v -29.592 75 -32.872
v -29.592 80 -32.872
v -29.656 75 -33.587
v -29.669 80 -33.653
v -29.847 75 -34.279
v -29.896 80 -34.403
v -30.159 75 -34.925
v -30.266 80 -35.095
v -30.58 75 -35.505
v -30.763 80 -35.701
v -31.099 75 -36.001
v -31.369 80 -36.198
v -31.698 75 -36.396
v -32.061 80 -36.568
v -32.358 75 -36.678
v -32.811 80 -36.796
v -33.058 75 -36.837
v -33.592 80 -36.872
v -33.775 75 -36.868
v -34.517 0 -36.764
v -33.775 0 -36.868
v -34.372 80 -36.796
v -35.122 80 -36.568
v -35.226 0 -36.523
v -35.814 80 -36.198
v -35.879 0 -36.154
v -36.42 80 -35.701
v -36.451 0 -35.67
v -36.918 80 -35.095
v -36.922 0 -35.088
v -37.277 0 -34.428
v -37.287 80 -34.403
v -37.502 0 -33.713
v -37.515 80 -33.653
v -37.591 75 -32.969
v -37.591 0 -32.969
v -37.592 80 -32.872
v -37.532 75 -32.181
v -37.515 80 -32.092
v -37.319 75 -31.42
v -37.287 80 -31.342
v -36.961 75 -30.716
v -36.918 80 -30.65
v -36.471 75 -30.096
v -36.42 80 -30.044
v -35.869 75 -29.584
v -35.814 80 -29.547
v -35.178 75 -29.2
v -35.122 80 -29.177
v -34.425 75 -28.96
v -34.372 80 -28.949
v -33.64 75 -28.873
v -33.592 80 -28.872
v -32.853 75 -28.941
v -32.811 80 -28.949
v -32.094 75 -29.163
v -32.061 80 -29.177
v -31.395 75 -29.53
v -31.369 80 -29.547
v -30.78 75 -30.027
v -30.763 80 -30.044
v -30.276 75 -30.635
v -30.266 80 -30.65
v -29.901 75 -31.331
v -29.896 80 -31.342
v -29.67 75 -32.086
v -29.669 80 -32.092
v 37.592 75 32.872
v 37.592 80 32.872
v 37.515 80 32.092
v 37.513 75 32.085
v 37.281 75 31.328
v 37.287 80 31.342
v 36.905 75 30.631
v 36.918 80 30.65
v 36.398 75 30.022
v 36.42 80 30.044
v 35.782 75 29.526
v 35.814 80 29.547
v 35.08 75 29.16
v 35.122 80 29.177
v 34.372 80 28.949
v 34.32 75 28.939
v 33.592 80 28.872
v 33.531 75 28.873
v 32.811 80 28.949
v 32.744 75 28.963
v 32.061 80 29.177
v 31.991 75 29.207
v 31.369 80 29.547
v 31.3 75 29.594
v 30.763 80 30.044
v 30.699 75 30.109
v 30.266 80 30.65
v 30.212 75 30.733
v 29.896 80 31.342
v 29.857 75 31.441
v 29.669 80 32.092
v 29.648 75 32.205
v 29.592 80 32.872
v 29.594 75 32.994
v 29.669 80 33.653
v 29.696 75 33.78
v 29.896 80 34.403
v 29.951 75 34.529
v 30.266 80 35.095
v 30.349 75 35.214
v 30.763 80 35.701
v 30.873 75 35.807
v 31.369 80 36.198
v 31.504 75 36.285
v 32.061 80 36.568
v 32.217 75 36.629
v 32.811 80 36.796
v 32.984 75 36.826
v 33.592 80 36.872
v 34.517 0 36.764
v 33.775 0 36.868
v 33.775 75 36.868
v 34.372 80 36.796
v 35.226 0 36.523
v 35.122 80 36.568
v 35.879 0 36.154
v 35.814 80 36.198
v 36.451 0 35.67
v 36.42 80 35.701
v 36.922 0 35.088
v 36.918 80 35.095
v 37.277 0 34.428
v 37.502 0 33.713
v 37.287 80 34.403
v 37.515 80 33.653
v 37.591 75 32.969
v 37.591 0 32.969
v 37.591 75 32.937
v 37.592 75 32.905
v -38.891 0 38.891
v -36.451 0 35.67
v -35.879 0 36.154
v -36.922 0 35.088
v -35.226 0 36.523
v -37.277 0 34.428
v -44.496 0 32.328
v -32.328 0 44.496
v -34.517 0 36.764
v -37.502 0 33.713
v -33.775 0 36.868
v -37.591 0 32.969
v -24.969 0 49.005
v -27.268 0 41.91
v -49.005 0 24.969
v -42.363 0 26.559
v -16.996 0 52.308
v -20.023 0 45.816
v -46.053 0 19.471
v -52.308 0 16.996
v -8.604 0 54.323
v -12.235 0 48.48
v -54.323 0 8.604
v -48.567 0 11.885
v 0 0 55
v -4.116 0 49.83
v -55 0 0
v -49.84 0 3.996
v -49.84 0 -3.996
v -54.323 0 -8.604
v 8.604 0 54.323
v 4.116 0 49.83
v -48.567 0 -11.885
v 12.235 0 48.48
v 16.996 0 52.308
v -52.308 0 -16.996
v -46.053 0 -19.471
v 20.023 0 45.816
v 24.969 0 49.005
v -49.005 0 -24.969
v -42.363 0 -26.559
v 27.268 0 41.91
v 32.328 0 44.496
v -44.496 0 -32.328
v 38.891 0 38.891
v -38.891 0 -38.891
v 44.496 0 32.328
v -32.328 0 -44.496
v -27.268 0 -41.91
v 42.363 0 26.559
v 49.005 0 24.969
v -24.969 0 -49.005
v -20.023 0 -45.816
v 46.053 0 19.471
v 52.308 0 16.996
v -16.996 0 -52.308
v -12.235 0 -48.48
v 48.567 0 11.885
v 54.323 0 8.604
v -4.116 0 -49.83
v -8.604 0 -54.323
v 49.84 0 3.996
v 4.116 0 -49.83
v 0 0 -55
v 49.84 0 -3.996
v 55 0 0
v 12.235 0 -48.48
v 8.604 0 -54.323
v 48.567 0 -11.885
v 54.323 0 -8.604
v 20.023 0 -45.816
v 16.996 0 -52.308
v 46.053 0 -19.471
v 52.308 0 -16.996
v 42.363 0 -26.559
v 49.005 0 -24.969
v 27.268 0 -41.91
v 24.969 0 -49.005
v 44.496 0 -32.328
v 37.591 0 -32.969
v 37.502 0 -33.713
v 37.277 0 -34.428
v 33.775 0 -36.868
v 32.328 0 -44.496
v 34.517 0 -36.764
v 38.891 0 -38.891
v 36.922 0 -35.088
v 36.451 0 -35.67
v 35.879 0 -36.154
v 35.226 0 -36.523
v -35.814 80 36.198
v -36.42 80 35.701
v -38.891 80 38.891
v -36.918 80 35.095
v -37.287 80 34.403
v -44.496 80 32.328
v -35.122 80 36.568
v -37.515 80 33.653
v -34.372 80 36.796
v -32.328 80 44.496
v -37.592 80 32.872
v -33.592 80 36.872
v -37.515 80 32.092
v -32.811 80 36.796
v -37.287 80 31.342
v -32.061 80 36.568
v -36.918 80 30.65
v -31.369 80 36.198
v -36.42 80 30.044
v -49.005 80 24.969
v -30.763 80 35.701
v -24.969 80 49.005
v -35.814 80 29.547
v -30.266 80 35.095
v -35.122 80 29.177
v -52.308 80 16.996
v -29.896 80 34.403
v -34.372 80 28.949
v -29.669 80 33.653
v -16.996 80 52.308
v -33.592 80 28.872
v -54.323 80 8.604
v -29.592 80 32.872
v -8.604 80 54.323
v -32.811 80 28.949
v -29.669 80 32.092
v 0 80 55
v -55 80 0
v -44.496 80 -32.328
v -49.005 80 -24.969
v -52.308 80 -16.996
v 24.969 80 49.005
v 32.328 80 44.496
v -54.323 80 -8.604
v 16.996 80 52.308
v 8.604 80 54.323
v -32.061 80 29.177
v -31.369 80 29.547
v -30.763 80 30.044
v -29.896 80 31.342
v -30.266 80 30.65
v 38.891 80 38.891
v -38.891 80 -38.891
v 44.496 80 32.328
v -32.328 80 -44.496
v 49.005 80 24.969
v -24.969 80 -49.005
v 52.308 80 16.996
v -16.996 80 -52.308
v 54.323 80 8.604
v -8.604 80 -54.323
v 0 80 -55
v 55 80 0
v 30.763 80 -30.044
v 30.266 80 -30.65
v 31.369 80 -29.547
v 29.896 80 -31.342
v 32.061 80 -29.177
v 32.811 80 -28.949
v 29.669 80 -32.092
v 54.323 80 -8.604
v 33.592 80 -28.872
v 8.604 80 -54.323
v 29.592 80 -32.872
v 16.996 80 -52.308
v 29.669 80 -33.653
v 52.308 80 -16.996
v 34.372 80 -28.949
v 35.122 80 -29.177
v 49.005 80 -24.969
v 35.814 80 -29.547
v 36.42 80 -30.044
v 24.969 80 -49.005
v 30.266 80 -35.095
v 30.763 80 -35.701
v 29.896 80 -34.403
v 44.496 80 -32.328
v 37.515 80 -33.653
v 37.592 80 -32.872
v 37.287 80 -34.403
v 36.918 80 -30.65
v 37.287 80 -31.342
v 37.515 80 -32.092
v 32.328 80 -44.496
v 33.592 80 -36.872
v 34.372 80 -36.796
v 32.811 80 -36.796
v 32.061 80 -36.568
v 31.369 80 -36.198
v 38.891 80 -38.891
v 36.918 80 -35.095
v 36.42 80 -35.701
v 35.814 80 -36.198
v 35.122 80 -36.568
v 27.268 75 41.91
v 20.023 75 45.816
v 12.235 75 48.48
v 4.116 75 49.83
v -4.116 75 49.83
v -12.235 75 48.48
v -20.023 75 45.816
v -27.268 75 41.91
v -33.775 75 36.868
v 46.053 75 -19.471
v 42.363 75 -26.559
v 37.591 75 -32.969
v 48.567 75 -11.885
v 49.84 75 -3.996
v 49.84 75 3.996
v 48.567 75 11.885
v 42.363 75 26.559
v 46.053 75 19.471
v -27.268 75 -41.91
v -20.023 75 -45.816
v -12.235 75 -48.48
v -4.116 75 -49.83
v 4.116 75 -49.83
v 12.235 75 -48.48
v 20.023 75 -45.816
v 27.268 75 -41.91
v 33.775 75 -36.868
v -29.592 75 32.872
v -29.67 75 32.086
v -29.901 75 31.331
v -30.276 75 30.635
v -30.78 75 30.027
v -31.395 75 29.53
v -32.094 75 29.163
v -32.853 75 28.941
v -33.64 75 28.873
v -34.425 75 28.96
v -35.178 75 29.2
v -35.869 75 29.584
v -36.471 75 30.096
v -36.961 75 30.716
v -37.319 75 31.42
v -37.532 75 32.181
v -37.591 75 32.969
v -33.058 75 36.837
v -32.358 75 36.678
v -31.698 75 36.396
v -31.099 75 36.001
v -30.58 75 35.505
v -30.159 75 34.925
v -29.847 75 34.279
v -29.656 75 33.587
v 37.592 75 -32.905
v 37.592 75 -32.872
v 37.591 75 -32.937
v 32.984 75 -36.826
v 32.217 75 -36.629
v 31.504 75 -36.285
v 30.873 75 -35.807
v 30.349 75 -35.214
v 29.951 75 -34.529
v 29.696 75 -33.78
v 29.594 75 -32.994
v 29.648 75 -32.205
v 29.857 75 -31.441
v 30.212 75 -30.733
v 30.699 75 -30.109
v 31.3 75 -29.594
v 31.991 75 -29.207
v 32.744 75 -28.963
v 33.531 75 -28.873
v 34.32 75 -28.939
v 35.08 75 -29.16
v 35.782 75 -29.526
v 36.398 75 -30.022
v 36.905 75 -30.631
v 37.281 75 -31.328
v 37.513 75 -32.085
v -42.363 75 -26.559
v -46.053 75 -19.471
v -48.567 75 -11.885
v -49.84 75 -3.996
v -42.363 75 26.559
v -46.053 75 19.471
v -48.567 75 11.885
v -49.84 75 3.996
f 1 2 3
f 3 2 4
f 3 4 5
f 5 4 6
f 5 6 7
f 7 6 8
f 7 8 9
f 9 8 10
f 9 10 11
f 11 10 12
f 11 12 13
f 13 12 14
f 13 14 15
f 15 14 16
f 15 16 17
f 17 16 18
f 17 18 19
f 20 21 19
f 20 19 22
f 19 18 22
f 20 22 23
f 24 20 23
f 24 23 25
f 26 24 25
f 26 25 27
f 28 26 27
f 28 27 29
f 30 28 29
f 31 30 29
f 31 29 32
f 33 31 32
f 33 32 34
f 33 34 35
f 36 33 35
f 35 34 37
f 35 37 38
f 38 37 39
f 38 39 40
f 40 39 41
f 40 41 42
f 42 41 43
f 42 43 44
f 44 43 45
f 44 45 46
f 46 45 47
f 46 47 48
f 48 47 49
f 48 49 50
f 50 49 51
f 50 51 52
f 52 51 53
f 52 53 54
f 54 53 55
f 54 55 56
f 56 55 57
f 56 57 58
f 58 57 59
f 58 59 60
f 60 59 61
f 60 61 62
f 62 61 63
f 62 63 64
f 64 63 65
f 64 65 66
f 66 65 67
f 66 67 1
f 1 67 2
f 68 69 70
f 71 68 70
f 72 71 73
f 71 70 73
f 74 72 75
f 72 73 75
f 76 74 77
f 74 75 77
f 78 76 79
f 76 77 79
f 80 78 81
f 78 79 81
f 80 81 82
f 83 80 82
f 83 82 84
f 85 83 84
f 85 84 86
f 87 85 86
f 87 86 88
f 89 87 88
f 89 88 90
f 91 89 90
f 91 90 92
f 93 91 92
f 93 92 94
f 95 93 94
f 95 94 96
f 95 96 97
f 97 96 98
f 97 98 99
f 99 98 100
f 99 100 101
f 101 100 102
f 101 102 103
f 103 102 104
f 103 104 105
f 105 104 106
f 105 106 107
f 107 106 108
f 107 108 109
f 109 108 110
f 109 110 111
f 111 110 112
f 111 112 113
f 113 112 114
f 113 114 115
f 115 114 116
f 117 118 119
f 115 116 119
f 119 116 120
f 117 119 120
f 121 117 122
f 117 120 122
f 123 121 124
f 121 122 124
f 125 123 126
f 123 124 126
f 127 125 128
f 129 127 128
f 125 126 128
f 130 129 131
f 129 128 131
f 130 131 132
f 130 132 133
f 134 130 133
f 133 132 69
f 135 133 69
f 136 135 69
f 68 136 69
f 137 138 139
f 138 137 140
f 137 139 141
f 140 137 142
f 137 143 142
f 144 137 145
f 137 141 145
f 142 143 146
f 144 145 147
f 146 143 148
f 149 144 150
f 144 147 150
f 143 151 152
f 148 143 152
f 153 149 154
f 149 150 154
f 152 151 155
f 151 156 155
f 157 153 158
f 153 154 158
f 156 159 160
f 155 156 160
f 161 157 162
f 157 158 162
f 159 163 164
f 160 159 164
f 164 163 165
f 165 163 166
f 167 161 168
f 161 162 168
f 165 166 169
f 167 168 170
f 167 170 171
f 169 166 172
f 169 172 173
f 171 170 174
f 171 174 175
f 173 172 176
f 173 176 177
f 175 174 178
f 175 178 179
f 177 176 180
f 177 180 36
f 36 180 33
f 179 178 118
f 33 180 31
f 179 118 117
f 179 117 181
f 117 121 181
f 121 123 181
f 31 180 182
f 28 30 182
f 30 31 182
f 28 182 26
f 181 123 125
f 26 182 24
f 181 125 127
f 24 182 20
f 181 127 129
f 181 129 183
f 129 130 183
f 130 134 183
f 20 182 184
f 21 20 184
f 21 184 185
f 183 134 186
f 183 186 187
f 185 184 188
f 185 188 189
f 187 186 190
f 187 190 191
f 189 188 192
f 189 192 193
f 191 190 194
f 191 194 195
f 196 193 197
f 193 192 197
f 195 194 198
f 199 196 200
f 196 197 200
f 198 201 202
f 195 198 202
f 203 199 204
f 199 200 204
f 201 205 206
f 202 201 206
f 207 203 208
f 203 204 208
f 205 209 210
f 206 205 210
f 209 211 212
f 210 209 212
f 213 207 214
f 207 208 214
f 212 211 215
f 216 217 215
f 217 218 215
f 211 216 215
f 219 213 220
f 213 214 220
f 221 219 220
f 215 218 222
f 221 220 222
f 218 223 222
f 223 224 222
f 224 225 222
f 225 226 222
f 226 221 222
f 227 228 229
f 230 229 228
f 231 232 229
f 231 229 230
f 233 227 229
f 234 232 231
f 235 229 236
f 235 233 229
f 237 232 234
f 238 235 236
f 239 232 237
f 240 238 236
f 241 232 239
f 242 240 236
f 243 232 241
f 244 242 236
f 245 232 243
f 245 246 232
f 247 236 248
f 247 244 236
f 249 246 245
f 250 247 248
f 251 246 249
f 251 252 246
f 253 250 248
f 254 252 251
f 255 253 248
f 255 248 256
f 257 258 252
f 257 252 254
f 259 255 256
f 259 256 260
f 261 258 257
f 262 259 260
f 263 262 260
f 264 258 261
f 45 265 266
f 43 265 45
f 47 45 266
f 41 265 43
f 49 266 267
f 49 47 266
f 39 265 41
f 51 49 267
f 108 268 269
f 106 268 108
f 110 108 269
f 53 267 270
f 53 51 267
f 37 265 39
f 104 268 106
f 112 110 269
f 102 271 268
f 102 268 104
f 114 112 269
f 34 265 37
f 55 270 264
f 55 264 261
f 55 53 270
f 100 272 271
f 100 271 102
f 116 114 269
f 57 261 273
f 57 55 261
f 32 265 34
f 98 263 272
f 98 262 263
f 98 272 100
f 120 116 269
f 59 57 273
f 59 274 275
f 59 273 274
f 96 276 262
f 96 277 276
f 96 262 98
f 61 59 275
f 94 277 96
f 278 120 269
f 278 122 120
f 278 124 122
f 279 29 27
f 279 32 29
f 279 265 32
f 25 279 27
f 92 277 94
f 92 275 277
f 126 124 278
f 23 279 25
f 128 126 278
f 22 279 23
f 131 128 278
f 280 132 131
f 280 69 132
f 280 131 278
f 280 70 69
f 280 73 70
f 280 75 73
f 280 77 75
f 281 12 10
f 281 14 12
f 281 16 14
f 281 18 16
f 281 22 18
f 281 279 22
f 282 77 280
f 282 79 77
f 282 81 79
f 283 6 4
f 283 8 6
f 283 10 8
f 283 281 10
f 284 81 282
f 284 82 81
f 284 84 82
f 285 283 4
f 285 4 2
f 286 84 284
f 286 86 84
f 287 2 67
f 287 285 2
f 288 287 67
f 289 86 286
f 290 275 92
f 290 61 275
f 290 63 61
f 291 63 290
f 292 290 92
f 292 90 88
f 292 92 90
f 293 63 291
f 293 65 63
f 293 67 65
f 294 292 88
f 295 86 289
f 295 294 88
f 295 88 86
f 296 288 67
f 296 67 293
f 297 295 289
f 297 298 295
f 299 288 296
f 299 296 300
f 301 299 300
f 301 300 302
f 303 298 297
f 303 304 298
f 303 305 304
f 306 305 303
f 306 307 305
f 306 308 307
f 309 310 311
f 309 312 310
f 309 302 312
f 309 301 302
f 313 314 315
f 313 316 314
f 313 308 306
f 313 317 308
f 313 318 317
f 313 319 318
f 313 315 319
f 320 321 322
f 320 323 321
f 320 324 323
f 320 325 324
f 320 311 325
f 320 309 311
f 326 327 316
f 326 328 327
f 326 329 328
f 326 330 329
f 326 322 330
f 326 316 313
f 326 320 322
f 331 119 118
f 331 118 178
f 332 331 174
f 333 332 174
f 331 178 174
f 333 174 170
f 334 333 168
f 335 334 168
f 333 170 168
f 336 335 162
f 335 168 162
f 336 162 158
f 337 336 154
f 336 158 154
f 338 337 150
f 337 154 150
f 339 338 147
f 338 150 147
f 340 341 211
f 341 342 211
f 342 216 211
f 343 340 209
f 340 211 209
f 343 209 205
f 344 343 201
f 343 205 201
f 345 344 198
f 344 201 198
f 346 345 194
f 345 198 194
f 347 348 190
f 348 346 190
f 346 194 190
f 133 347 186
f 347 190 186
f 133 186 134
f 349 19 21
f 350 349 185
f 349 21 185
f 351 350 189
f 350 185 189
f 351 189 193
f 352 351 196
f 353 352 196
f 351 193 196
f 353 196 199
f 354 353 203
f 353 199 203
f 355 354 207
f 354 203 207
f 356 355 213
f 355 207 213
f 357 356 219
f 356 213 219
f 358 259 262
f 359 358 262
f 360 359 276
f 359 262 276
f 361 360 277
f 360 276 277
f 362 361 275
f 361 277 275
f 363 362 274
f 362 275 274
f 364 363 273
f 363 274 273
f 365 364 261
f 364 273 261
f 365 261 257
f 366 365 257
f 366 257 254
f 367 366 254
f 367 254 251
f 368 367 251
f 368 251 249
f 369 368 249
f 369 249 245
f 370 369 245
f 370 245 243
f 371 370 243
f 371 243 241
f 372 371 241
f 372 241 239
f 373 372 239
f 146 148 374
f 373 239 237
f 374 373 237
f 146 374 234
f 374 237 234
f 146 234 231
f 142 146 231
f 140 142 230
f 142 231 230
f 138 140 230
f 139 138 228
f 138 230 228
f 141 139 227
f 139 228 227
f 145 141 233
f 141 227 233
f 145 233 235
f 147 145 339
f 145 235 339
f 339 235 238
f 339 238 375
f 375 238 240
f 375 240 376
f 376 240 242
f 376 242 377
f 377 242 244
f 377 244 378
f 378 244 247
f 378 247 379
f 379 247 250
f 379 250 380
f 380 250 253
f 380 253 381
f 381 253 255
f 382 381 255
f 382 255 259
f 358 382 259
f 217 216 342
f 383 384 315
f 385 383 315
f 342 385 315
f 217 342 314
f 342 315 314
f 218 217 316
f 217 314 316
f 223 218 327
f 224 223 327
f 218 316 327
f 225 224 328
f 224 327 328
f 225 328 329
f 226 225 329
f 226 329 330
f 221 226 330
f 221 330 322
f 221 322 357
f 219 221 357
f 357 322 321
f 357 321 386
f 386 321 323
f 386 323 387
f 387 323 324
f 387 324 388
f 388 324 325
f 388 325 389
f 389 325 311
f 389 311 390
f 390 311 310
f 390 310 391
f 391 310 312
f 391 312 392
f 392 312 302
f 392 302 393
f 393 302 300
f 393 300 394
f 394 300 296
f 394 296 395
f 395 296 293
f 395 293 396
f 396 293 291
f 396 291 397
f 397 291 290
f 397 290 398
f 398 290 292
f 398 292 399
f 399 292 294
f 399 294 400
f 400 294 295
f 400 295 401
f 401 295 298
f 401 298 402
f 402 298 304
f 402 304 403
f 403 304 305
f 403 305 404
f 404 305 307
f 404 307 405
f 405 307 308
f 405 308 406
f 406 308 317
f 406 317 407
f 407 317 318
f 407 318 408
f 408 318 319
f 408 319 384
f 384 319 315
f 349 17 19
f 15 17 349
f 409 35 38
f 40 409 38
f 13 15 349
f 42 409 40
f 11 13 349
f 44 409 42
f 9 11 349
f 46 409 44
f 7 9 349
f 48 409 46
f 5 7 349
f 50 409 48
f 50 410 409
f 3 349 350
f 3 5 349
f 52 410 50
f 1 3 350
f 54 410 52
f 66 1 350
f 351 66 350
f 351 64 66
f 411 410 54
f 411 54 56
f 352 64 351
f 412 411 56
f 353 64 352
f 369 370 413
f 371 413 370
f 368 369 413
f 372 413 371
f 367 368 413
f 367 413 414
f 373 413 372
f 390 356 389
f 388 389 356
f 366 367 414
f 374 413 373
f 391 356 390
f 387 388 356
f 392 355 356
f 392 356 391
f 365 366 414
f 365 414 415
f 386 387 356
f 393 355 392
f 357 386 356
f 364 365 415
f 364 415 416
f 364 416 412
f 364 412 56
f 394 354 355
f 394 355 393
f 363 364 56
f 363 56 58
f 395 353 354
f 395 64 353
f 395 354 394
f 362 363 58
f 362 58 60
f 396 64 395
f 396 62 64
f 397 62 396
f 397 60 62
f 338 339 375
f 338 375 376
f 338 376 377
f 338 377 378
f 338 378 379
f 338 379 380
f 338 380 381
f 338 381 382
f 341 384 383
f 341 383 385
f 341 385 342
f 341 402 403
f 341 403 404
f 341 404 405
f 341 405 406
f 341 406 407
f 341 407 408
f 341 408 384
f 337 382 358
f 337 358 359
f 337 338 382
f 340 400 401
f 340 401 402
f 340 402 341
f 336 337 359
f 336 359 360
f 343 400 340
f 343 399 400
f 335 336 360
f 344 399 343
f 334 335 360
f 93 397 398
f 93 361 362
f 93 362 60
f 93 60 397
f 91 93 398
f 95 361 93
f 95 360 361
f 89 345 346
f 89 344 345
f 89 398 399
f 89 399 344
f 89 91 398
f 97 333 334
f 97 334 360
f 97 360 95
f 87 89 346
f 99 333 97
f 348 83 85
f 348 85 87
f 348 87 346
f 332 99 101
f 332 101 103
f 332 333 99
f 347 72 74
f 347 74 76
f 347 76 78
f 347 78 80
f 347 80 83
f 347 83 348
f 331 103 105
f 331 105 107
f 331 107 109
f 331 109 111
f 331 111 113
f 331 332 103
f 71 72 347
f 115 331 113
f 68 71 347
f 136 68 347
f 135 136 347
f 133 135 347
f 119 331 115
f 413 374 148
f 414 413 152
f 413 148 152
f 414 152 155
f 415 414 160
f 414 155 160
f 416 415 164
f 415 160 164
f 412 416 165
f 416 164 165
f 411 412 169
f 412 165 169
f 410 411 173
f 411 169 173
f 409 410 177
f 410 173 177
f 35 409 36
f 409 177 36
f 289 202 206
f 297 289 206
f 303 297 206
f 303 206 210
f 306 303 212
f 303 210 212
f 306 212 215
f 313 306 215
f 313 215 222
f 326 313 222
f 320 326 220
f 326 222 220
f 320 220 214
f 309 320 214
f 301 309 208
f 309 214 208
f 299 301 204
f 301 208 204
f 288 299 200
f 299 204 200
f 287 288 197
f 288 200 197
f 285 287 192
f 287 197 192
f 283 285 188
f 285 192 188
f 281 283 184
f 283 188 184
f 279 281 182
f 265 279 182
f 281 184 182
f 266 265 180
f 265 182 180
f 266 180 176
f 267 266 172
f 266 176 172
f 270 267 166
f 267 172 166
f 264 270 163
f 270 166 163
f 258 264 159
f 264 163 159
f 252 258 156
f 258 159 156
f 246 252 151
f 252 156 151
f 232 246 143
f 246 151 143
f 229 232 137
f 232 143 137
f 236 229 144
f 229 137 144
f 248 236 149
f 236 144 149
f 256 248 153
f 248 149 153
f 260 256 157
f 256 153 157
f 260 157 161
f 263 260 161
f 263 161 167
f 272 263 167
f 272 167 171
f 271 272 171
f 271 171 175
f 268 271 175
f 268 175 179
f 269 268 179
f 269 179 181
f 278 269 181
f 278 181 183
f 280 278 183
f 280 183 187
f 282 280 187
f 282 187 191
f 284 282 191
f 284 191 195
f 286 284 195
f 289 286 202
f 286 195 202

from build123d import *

# Parameters (mm, degrees)
SKETCH_1_R          = 55
EXTRUDE_1_DEPTH     = 80
SKETCH_2_R          = 50
CUT_EXTRUDE_1_DEPTH = 75
SKETCH_3_W          = 33.5
SKETCH_3_H          = 15
CUT_EXTRUDE_2_DEPTH = 6
SKETCH_4_R          = 4
CUT_EXTRUDE_3_DEPTH = 81
SKETCH2_W           = 33.5
SKETCH2_H           = 15
BOSS_EXTRUDE1_DEPTH = 5


with BuildPart() as part:
    # Эскиз1 → Бобышка-Вытянуть1 (new body)
    with BuildSketch(Plane(origin=(0, 0, 0), x_dir=(1, 0, 0), z_dir=(0, 1, 0))):
        Circle(SKETCH_1_R)
    extrude(amount=EXTRUDE_1_DEPTH)

    # Эскиз2 → Вырез-Вытянуть1 (cut)
    with BuildSketch(Plane.XZ):
        Circle(SKETCH_2_R)
    extrude(amount=-CUT_EXTRUDE_1_DEPTH, mode=Mode.SUBTRACT)

    # Эскиз3 → Вырез-Вытянуть2 (cut, through all)
    with BuildSketch(Plane.XZ.offset(-75)):
        Rectangle(SKETCH_3_W, SKETCH_3_H)
    extrude(amount=-CUT_EXTRUDE_2_DEPTH, mode=Mode.SUBTRACT)

    # Эскиз4 → Вырез-Вытянуть3 (cut, through all)
    with BuildSketch(Plane(origin=(0, 80, 0), x_dir=(1, 0, 0), z_dir=(0, 1, 0))):
        with Locations((33.591727056, -32.872418125)):
            Circle(SKETCH_4_R)
        with Locations((-33.591727056, -32.872418125)):
            Circle(SKETCH_4_R)
        with Locations((-33.591727056, 32.872418125)):
            Circle(SKETCH_4_R)
        with Locations((33.591727056, 32.872418125)):
            Circle(SKETCH_4_R)
    extrude(amount=-CUT_EXTRUDE_3_DEPTH, mode=Mode.SUBTRACT)

    # Sketch2 → Boss-Extrude1 (add)
    with BuildSketch(Plane(origin=(0, 80, 0), x_dir=(1, 0, 0), z_dir=(0, 1, 0))):
        Rectangle(SKETCH2_W, SKETCH2_H)
    extrude(amount=-BOSS_EXTRUDE1_DEPTH)


solid = part.part
